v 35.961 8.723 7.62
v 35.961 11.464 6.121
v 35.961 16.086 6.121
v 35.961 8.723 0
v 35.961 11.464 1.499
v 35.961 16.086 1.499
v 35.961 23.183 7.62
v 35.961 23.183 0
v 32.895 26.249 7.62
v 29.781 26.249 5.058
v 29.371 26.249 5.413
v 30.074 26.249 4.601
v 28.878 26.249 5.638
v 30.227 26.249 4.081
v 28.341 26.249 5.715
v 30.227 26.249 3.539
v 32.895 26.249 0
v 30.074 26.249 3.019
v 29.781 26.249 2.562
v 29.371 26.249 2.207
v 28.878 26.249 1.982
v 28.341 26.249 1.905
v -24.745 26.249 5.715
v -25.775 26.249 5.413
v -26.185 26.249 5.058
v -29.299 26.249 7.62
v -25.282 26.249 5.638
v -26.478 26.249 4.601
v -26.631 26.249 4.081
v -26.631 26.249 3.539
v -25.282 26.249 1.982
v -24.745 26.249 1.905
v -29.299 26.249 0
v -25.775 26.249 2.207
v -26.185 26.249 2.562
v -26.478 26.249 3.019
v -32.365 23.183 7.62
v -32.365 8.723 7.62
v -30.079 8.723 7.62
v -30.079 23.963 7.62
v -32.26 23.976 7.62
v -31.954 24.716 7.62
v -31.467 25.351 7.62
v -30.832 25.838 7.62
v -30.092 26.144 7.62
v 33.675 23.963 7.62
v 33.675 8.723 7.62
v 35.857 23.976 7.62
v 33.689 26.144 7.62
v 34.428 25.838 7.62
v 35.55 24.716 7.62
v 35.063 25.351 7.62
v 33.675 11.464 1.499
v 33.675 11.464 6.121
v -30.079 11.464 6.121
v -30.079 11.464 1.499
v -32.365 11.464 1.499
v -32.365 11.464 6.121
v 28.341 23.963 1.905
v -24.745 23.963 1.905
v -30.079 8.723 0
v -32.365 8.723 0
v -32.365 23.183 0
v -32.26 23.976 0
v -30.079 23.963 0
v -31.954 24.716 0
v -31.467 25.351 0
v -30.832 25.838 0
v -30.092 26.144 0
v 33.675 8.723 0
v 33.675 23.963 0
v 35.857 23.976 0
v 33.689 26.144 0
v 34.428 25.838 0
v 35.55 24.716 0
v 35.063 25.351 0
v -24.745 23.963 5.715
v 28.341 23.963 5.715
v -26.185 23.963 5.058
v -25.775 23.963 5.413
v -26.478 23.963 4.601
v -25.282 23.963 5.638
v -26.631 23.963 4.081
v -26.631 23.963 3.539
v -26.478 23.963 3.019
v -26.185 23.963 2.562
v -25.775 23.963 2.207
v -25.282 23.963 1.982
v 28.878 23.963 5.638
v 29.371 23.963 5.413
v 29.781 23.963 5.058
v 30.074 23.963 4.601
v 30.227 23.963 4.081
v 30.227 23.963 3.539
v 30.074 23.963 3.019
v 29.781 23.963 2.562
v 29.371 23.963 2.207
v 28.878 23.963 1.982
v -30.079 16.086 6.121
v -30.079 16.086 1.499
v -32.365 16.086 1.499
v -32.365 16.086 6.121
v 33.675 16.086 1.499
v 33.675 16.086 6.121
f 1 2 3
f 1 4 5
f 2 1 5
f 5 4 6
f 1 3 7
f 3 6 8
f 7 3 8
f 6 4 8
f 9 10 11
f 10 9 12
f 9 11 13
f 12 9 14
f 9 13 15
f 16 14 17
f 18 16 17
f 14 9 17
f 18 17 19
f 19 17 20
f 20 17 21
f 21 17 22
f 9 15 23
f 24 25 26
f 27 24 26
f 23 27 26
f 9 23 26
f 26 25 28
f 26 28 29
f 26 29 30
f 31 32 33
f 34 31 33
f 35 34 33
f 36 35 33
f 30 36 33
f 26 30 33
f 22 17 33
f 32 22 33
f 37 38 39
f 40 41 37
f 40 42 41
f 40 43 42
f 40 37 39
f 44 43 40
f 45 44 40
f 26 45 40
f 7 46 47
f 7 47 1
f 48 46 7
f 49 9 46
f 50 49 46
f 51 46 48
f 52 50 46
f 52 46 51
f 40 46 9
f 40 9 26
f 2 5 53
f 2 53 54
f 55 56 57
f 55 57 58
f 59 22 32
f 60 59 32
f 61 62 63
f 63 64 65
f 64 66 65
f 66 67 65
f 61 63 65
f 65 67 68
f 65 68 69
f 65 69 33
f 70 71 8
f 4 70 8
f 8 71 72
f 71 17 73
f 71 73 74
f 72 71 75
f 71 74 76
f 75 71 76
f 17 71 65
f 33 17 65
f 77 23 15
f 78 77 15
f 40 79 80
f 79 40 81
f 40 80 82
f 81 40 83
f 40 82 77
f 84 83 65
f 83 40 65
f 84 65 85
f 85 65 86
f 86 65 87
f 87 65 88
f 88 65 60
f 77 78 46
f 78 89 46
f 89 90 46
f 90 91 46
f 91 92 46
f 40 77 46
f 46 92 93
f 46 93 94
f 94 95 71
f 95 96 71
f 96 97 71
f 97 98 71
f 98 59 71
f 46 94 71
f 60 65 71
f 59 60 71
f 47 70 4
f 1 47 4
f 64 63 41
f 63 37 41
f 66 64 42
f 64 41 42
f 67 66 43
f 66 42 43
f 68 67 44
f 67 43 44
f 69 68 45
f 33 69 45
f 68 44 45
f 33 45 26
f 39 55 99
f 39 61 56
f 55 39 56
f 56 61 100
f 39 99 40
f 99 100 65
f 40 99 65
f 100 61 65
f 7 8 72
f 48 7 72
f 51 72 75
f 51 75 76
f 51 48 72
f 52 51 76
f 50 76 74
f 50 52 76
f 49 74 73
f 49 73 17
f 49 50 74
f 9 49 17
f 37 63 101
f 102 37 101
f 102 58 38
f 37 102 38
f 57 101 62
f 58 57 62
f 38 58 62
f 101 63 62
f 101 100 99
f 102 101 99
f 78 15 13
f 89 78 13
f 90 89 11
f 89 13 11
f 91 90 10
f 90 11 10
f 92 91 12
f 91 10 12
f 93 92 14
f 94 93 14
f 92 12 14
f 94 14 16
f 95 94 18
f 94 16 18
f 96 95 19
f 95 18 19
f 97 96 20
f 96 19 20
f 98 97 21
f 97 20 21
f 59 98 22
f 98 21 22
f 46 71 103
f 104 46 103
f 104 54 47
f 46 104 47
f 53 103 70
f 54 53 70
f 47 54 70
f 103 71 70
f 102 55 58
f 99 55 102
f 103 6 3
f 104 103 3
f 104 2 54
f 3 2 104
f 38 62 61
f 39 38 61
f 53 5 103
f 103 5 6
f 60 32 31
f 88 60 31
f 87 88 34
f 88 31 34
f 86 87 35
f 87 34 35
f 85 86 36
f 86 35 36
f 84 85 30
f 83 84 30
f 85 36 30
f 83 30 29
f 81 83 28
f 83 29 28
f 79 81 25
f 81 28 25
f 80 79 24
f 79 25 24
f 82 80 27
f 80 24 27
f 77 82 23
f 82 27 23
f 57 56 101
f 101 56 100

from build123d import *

# Parameters (mm, degrees)
F1_DEPTH = 7.62
F2_W     = 4.6228
F2_H     = 4.6228
F3_DEPTH = 86.106
F5_DEPTH = 25.4
F6_R     = 3.066051


with BuildPart() as f1:
    # F0 (on Top) → F1 (new body)
    with BuildSketch(Plane.XY):
        Polygon((-30.078946, 8.722895), (-30.078946, 23.962895), (33.675054, 23.962895), (33.675054, 8.722895), (35.961054, 8.722895), (35.961054, 26.248895), (-32.364946, 26.248895), (-32.364946, 8.722895), align=None)
    extrude(amount=F1_DEPTH)

    # F2 (on face) → F3 (cut)
    with BuildSketch(Plane.YZ.offset(35.961054)):
        with Locations((13.775022, 3.81)):
            Rectangle(F2_W, F2_H)
    extrude(amount=-F3_DEPTH, mode=Mode.SUBTRACT)

    # F4 (on face) → F5 (cut)
    with BuildSketch(Plane(origin=(0, 26.248895, 0), x_dir=(-1, 0, 0), z_dir=(0, 1, 0))):
        with BuildLine():
            Line((24.744946, 5.715), (-28.341054, 5.715))
            Line((-28.341054, 5.715), (-28.341054, 1.905))
            Line((-28.341054, 1.905), (24.744946, 1.905))
            ThreePointArc((24.744946, 1.905), (26.649946, 3.81), (24.744946, 5.715))
        make_face()
        with BuildLine():
            Line((-28.341054, 1.905), (-28.341054, 5.715))
            ThreePointArc((-28.341054, 5.715), (-30.246054, 3.81), (-28.341054, 1.905))
        make_face()
    extrude(amount=-F5_DEPTH, mode=Mode.SUBTRACT)

    # F6
    f6_edges = [f1.edges().sort_by_distance(p)[0] for p in [
        (35.961054, 26.248895, 3.81),
        (-32.364946, 26.248895, 3.81),
    ]]
    fillet(f6_edges, radius=F6_R)


solid = f1.part
